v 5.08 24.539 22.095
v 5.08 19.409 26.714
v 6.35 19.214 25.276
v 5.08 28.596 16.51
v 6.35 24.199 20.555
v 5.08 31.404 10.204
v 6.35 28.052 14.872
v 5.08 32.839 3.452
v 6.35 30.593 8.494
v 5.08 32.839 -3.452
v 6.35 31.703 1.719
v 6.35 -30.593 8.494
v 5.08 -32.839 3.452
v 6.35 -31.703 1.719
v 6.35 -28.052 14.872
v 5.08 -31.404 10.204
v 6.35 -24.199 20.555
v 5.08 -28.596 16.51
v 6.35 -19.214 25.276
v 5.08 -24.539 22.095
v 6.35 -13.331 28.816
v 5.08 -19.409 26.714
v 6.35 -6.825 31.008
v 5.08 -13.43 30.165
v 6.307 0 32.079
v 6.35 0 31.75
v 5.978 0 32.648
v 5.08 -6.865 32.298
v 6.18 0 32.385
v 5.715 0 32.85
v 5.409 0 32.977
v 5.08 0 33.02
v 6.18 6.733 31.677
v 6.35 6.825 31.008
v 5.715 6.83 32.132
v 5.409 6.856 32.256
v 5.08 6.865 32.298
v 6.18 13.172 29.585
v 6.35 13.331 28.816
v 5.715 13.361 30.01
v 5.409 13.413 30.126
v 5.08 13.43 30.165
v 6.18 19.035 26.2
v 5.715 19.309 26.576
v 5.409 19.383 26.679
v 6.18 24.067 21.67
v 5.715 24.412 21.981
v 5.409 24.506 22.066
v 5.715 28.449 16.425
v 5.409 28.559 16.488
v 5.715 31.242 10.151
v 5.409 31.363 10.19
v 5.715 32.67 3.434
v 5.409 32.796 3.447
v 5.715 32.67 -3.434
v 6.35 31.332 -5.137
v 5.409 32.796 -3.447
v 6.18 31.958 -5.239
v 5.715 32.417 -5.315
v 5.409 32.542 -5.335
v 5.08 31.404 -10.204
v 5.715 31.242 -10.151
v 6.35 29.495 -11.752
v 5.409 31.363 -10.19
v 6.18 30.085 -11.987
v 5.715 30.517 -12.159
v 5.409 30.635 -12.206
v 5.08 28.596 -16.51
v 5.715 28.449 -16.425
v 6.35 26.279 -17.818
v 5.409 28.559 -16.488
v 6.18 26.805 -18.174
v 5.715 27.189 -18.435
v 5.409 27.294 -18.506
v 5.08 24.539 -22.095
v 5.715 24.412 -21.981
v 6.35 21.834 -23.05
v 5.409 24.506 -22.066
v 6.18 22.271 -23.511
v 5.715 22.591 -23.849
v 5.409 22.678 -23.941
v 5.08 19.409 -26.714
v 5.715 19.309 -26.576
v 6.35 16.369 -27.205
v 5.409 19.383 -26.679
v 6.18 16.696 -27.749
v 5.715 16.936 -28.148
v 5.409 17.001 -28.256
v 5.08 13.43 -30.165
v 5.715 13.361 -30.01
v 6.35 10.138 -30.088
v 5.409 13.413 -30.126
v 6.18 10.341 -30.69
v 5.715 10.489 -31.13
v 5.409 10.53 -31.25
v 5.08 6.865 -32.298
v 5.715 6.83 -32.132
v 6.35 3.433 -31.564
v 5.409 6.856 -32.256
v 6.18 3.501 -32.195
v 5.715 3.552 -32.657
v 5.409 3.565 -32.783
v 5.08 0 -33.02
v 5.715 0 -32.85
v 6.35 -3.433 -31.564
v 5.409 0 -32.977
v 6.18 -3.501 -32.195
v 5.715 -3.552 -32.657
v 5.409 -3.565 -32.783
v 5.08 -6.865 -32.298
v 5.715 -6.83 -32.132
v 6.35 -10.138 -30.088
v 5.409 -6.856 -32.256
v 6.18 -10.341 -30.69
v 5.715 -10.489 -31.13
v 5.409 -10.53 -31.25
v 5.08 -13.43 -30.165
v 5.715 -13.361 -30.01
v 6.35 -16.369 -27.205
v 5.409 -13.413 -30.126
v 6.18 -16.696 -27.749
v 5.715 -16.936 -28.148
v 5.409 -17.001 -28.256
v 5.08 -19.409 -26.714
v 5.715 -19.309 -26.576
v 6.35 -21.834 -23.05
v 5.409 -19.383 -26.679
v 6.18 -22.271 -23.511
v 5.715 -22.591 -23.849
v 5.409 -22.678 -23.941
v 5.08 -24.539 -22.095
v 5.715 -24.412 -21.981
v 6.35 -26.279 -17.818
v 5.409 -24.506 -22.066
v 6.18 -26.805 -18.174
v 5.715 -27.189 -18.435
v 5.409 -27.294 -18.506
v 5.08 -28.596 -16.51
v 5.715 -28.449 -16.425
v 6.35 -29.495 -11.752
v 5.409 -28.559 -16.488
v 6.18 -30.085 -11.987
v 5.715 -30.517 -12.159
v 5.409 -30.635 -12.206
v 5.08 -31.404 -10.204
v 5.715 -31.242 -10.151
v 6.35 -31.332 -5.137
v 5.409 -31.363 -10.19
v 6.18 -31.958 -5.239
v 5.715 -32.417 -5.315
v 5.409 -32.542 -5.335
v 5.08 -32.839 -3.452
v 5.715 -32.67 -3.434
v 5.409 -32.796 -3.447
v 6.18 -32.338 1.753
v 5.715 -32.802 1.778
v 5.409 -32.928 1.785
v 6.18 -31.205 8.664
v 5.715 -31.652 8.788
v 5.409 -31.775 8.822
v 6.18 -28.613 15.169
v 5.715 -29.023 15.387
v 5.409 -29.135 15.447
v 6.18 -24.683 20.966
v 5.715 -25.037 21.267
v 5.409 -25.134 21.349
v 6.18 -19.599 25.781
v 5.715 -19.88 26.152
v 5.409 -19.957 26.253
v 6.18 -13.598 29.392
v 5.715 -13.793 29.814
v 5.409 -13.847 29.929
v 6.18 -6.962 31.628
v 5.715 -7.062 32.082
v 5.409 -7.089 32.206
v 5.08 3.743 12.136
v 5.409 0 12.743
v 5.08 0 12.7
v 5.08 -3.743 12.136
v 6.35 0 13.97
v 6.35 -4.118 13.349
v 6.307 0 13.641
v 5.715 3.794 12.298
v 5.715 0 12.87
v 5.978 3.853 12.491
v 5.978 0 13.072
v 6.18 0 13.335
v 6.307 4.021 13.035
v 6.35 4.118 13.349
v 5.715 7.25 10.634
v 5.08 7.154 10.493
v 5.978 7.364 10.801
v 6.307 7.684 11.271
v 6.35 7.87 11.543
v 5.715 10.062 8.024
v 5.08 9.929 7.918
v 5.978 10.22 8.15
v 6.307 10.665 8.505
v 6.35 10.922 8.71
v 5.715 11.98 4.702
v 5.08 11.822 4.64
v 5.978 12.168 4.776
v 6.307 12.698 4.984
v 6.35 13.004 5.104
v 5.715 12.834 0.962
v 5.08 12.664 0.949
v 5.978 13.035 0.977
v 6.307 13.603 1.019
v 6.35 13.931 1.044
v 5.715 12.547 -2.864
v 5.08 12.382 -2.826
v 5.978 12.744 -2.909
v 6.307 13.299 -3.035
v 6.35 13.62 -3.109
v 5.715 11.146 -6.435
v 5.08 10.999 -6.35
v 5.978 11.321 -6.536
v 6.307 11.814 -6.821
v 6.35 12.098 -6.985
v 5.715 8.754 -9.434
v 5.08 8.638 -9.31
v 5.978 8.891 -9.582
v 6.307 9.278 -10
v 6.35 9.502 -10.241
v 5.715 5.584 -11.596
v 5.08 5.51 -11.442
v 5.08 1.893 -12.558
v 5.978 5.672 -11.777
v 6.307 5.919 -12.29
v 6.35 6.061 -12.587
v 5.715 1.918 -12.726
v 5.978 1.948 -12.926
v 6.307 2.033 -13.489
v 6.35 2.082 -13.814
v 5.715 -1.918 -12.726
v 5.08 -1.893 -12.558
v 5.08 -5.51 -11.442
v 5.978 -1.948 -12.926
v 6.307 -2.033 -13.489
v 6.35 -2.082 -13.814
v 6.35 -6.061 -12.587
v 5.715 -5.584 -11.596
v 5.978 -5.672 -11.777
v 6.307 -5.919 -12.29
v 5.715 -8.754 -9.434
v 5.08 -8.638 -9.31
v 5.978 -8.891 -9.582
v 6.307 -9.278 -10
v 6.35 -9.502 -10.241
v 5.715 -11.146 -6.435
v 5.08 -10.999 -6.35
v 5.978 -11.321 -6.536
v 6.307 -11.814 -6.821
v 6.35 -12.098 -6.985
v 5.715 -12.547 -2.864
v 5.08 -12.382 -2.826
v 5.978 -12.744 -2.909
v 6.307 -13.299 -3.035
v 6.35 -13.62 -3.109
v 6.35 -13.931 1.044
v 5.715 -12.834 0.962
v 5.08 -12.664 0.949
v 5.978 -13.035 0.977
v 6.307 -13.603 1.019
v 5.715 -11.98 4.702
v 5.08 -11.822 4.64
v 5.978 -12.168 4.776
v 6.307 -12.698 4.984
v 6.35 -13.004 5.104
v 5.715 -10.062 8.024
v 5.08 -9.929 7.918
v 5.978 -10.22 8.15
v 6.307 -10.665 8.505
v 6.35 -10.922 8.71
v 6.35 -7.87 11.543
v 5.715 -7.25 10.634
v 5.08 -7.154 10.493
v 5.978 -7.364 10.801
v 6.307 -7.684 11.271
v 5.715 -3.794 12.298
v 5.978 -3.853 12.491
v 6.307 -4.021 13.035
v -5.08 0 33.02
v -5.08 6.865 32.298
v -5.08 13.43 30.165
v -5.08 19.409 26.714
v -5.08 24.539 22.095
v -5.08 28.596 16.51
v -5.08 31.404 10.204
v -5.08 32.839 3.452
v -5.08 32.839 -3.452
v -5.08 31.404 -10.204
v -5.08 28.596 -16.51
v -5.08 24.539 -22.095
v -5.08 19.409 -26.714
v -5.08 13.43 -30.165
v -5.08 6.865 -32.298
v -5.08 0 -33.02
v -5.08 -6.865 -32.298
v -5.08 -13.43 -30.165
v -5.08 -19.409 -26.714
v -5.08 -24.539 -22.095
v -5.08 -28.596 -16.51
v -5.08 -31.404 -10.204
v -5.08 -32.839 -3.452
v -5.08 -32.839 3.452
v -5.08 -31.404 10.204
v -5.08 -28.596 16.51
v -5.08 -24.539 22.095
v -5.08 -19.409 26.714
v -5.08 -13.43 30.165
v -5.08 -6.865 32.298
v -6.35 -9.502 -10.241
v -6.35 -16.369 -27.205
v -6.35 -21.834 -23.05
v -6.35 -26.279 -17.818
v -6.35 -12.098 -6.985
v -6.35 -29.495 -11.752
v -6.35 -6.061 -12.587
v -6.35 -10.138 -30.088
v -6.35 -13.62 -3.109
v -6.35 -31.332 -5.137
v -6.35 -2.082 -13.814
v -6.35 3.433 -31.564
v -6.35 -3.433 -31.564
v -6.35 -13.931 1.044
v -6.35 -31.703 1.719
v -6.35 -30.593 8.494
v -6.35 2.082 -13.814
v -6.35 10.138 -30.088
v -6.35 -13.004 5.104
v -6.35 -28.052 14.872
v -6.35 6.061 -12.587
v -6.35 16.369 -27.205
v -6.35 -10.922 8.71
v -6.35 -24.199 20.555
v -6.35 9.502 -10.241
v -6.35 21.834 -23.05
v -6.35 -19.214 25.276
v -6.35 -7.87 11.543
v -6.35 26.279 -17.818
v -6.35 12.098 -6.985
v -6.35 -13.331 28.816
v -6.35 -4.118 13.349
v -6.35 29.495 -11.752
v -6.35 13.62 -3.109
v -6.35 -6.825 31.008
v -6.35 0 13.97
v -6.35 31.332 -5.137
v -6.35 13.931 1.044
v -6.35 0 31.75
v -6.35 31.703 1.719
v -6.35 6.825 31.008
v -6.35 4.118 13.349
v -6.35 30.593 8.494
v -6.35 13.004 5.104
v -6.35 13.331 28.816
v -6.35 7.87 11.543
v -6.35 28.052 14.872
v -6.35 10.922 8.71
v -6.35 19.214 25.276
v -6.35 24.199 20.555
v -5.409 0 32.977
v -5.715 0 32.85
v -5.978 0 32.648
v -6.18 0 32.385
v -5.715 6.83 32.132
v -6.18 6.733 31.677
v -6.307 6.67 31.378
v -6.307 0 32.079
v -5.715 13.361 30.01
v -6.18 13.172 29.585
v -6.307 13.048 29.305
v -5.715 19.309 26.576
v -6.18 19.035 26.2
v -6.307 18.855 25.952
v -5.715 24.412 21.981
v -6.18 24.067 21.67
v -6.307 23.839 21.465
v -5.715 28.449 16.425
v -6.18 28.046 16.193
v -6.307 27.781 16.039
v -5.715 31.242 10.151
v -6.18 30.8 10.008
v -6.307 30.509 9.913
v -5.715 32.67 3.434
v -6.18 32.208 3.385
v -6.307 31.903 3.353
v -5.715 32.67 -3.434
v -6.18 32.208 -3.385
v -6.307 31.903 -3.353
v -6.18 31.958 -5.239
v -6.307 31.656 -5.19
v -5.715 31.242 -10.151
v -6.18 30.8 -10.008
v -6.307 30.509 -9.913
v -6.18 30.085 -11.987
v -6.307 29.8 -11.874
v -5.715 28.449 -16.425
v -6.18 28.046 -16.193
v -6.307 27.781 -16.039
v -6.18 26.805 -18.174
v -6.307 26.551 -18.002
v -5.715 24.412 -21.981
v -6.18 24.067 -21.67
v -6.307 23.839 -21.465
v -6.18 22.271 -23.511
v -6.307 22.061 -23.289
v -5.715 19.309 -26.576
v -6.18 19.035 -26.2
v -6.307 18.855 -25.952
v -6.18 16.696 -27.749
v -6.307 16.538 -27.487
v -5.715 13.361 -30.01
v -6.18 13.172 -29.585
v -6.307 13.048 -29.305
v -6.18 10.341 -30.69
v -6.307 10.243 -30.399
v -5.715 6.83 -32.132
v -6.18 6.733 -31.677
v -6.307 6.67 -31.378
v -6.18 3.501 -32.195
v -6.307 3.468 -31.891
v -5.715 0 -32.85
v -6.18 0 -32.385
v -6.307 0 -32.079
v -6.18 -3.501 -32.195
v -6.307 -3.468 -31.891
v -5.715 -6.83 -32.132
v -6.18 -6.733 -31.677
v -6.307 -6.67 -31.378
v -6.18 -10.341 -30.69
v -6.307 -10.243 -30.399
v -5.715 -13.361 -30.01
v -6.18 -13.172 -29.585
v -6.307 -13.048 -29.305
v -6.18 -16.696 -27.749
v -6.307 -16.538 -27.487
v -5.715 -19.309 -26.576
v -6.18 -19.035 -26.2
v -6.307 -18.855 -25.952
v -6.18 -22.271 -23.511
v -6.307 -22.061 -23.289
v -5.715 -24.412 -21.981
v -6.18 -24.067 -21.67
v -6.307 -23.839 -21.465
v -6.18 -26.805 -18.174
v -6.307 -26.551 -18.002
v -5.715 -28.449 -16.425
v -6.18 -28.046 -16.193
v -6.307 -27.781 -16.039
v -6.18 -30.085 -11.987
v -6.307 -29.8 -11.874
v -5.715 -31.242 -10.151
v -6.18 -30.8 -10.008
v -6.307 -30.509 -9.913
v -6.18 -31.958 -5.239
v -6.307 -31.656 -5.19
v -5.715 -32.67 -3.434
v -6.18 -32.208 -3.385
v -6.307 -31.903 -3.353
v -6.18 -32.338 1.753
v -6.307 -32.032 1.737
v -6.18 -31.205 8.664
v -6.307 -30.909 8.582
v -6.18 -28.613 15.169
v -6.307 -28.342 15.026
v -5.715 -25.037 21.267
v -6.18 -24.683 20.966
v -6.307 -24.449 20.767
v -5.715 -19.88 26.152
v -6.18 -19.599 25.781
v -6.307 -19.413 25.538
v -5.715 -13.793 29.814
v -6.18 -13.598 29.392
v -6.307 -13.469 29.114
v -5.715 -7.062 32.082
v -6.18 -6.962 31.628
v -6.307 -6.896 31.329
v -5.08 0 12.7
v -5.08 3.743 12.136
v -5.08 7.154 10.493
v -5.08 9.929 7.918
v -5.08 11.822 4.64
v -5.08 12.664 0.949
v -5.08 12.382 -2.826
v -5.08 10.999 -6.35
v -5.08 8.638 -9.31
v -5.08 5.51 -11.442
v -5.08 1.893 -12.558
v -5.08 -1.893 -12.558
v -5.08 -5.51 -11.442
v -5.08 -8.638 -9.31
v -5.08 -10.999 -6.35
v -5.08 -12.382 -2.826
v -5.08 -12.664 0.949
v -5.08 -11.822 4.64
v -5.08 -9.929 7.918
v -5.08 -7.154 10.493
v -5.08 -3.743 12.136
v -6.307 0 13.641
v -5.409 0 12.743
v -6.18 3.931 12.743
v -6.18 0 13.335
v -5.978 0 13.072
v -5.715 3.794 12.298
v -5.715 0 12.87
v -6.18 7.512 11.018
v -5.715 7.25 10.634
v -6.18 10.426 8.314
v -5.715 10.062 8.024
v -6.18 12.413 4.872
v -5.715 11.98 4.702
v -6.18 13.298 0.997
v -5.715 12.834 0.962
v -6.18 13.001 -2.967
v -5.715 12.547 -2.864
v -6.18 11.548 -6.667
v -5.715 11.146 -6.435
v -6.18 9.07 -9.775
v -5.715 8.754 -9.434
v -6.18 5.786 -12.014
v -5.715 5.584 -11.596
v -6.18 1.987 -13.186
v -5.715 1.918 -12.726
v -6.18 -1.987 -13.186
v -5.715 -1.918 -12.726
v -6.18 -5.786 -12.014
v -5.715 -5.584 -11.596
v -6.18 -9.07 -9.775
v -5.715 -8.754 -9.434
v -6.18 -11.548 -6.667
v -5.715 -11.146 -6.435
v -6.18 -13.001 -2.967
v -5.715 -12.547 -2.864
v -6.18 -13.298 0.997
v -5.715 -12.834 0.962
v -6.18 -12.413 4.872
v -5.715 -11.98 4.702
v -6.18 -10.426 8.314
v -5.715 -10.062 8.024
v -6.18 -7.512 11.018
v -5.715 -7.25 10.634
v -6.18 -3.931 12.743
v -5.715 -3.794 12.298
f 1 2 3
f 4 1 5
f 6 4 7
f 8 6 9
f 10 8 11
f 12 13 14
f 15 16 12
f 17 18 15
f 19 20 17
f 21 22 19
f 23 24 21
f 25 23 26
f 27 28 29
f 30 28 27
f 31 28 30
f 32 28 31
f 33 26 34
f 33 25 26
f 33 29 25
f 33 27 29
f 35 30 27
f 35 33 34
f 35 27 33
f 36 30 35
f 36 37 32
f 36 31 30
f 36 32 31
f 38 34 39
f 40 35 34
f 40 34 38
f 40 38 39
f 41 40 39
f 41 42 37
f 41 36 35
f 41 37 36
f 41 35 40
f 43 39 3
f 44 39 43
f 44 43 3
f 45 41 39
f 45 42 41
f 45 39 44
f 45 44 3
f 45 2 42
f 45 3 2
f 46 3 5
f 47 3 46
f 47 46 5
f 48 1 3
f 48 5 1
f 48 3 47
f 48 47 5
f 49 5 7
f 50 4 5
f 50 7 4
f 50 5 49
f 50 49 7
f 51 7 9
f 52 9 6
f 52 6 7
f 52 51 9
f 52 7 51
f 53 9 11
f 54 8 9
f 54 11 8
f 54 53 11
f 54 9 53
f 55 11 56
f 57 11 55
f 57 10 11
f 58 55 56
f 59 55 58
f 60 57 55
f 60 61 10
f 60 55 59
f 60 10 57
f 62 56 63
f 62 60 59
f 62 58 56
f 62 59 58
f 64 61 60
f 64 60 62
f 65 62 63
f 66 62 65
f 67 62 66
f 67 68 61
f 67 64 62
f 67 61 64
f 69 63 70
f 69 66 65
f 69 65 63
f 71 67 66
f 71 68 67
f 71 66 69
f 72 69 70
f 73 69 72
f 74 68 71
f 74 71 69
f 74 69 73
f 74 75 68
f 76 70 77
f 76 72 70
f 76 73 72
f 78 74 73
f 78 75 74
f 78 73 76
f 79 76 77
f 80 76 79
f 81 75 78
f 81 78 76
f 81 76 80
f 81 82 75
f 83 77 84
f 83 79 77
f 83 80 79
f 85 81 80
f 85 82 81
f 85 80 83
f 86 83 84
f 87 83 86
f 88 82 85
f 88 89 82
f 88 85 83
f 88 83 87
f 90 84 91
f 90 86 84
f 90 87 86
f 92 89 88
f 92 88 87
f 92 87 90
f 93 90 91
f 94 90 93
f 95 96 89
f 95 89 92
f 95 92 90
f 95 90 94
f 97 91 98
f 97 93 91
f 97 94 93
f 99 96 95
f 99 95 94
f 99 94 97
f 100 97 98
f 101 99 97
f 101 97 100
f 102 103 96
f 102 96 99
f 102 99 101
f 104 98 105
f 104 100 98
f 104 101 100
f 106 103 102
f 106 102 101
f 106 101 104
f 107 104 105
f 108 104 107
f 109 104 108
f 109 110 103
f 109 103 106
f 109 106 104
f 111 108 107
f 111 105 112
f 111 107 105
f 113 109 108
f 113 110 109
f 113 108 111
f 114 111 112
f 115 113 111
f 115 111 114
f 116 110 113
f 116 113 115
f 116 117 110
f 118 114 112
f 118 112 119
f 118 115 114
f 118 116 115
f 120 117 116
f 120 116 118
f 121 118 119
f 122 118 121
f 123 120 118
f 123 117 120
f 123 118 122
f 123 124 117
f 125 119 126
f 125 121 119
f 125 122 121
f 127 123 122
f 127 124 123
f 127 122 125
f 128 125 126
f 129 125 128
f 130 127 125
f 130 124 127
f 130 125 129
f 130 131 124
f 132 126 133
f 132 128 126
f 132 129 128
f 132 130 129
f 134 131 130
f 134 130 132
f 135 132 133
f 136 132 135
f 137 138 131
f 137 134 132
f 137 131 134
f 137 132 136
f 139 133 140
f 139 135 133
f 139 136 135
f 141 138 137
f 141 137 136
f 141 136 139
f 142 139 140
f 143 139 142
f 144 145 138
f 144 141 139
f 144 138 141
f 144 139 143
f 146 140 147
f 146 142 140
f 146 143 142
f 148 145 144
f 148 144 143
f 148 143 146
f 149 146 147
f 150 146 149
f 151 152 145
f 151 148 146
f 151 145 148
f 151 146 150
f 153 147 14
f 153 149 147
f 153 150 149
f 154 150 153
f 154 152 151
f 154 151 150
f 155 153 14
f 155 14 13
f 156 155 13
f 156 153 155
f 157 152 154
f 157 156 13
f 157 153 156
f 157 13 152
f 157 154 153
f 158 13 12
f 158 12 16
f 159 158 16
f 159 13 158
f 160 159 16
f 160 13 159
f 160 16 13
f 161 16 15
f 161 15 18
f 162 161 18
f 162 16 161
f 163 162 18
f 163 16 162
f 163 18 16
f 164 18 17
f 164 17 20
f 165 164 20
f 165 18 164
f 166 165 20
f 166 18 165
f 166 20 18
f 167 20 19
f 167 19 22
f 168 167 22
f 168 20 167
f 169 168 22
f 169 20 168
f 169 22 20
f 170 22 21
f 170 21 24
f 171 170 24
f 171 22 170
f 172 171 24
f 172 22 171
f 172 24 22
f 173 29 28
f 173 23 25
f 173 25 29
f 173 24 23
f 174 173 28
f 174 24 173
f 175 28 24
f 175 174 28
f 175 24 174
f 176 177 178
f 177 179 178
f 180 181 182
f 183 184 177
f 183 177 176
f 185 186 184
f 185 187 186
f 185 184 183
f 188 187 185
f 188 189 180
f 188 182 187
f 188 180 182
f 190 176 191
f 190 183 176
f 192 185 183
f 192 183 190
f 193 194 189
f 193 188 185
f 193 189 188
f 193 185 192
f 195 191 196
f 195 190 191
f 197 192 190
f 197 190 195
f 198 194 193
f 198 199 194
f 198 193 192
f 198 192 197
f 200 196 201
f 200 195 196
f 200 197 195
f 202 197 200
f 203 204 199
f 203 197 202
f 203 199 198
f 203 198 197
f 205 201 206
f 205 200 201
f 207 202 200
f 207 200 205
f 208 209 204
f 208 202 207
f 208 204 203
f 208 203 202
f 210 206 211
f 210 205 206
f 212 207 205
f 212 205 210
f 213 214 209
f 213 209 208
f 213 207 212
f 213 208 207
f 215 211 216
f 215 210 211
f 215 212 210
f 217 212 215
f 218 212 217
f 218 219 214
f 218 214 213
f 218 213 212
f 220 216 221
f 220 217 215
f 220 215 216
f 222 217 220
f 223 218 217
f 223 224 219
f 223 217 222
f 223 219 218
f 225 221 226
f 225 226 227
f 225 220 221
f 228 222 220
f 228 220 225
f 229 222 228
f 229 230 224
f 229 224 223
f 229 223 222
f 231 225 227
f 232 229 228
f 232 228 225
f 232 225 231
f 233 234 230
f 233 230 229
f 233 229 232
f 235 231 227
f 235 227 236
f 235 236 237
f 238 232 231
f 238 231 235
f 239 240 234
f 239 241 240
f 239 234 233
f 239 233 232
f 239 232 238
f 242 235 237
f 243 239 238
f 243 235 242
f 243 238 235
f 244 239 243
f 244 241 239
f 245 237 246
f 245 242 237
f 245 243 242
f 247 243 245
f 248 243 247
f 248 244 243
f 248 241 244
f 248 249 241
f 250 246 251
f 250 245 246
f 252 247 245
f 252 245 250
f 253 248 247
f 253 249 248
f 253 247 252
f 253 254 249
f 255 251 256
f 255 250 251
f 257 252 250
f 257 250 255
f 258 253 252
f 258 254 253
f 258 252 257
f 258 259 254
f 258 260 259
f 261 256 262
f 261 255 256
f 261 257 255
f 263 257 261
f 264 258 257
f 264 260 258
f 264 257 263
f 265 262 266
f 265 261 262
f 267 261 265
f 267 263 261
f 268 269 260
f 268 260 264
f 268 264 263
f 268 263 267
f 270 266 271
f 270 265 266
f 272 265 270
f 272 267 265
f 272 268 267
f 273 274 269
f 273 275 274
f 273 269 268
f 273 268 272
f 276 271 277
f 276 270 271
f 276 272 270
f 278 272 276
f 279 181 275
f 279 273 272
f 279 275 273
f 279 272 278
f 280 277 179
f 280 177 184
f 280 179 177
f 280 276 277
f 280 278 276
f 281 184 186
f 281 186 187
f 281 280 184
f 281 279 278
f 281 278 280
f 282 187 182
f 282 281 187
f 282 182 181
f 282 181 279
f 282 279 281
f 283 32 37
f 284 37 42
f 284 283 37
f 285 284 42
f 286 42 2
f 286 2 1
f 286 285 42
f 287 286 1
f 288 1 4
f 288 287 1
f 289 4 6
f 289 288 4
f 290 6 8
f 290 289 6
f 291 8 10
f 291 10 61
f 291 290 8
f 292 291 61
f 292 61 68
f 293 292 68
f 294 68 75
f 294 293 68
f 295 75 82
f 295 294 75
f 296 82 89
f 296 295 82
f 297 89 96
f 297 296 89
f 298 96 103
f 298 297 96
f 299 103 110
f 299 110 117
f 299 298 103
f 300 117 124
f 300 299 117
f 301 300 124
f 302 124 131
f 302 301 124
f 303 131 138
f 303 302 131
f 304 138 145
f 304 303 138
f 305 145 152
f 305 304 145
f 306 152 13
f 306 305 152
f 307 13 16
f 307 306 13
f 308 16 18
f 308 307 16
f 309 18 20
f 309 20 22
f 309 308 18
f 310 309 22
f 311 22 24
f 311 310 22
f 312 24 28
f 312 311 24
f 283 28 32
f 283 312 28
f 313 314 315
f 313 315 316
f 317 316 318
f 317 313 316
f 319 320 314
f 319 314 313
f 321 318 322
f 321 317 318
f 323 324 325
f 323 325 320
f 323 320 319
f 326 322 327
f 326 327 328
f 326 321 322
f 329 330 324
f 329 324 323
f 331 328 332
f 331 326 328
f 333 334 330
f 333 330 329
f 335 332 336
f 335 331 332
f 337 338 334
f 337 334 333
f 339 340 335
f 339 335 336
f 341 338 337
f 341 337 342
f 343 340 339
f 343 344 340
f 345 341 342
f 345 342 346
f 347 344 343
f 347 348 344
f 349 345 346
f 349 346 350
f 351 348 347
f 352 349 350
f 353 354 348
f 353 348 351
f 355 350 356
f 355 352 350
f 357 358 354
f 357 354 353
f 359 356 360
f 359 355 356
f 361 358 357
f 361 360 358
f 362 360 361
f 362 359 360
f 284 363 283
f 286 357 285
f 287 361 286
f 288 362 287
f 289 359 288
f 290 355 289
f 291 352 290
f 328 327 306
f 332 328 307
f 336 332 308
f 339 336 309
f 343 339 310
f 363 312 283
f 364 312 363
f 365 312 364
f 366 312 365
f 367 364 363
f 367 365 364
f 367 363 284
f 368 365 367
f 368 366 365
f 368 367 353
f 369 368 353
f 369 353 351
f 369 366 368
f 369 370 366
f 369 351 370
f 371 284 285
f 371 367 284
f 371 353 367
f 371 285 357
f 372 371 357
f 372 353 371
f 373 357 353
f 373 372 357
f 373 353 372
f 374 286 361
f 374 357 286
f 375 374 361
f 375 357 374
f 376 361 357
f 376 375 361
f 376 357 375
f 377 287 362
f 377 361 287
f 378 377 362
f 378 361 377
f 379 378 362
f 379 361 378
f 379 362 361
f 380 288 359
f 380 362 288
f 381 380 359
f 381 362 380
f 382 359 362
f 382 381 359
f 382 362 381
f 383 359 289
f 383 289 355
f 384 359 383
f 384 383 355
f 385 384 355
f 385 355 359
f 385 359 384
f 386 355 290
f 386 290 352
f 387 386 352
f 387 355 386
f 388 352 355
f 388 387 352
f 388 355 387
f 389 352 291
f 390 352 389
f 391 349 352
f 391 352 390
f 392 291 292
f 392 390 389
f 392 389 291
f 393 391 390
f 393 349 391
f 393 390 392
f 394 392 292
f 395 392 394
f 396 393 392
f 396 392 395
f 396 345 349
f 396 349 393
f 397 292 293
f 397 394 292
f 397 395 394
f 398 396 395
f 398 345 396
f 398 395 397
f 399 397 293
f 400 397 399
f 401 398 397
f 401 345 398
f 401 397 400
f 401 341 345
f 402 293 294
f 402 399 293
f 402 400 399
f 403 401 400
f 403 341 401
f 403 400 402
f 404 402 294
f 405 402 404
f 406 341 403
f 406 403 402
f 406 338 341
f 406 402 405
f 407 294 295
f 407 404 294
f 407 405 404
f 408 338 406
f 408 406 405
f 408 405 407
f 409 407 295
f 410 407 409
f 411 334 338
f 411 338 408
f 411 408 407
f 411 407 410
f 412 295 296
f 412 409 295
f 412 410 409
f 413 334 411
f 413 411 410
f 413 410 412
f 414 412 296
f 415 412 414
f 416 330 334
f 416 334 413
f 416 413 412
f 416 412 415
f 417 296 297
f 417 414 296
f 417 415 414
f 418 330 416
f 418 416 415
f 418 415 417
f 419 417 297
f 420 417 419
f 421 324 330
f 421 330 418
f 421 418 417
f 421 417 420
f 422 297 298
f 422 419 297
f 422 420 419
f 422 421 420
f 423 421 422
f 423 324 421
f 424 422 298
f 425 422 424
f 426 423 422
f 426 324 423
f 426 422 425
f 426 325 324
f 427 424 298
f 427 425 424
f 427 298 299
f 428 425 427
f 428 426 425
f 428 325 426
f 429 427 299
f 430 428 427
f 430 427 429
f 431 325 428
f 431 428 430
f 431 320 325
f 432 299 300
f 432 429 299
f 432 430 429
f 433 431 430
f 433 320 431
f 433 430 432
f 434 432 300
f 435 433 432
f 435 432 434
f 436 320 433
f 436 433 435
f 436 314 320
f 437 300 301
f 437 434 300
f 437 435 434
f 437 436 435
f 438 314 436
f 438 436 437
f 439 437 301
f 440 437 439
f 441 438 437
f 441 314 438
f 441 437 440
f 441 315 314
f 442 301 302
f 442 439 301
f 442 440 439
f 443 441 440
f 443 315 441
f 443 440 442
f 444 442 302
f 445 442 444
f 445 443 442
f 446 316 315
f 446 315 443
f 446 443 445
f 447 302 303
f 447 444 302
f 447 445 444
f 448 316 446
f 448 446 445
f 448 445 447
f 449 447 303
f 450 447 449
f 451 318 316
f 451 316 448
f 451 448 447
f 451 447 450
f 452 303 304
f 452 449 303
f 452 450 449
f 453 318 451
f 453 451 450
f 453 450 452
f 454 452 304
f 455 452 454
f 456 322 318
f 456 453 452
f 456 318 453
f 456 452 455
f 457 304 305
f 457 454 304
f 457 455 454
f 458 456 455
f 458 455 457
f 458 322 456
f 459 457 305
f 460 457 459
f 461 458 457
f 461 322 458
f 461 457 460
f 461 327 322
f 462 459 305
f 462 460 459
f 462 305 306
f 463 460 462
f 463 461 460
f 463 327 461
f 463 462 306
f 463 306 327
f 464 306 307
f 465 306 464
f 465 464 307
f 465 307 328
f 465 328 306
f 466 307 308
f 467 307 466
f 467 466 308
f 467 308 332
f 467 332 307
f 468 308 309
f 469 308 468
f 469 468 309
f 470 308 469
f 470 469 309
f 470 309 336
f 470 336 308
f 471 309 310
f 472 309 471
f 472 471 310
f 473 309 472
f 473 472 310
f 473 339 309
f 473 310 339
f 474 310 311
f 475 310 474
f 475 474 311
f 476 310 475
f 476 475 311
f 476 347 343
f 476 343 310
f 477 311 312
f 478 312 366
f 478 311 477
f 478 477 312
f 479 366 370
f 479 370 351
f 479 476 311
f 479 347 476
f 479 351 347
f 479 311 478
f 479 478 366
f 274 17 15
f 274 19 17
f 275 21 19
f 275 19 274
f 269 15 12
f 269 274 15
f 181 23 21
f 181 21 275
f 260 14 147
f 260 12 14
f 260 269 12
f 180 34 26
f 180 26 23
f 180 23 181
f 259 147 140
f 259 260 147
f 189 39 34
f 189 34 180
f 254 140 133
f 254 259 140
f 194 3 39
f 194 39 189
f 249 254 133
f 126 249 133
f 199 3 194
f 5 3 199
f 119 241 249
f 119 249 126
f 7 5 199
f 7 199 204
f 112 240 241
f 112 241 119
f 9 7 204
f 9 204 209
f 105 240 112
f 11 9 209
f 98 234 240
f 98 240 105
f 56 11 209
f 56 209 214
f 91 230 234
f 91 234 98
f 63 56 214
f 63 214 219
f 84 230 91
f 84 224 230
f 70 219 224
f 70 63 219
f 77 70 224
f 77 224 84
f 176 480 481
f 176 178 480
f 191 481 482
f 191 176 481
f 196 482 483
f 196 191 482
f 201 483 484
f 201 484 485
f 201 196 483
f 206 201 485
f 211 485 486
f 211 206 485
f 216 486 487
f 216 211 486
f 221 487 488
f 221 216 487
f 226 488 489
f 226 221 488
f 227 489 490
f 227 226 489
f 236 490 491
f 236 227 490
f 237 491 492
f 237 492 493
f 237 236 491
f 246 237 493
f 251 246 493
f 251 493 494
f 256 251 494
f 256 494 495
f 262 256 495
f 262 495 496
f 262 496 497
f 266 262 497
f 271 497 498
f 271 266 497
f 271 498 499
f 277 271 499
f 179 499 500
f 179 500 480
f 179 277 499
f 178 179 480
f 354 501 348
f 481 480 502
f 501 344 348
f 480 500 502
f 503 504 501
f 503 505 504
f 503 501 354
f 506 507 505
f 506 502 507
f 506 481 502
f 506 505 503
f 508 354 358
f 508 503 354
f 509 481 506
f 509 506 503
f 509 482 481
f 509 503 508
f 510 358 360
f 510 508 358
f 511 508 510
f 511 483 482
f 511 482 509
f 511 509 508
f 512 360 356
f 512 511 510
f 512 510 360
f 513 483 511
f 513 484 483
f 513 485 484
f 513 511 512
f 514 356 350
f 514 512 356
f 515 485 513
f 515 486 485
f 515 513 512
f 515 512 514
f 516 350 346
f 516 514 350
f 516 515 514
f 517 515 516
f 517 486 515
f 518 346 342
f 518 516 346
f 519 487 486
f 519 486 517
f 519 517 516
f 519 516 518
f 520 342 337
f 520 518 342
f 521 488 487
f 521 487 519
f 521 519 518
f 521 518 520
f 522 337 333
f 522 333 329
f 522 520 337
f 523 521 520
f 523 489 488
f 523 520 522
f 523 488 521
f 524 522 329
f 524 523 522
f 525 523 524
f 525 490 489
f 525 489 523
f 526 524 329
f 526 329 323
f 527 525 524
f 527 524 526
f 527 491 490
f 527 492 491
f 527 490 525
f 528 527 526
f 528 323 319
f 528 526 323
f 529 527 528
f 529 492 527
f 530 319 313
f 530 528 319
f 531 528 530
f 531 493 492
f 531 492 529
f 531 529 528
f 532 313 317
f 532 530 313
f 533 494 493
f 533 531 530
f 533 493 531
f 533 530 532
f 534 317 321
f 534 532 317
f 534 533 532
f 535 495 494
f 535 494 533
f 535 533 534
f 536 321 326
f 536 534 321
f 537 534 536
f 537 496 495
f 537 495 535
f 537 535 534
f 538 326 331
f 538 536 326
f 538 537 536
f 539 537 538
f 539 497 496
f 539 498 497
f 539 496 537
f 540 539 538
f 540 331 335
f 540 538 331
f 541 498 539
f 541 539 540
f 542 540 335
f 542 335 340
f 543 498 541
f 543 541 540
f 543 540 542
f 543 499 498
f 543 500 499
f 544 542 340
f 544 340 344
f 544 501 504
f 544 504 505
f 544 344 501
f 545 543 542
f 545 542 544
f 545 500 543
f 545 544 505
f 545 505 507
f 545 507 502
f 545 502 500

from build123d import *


with BuildPart() as f1:
    # F0 (on Front) → F1 (revolve)
    with BuildSketch(Plane.XZ):
        with BuildLine():
            Line((5.08, 33.02), (-5.08, 33.02))
            ThreePointArc((-5.08, 33.02), (-5.978026, 32.648026), (-6.35, 31.75))
            Line((-6.35, 31.75), (-6.35, 13.97))
            ThreePointArc((-6.35, 13.97), (-5.978026, 13.071974), (-5.08, 12.7))
            Line((-5.08, 12.7), (5.08, 12.7))
            ThreePointArc((5.08, 12.7), (5.978026, 13.071974), (6.35, 13.97))
            Line((6.35, 13.97), (6.35, 31.75))
            ThreePointArc((6.35, 31.75), (5.978026, 32.648026), (5.08, 33.02))
        make_face()
    revolve(axis=Axis((-17.721478, 0, 0), (-1, 0, 0)))


solid = f1.part
